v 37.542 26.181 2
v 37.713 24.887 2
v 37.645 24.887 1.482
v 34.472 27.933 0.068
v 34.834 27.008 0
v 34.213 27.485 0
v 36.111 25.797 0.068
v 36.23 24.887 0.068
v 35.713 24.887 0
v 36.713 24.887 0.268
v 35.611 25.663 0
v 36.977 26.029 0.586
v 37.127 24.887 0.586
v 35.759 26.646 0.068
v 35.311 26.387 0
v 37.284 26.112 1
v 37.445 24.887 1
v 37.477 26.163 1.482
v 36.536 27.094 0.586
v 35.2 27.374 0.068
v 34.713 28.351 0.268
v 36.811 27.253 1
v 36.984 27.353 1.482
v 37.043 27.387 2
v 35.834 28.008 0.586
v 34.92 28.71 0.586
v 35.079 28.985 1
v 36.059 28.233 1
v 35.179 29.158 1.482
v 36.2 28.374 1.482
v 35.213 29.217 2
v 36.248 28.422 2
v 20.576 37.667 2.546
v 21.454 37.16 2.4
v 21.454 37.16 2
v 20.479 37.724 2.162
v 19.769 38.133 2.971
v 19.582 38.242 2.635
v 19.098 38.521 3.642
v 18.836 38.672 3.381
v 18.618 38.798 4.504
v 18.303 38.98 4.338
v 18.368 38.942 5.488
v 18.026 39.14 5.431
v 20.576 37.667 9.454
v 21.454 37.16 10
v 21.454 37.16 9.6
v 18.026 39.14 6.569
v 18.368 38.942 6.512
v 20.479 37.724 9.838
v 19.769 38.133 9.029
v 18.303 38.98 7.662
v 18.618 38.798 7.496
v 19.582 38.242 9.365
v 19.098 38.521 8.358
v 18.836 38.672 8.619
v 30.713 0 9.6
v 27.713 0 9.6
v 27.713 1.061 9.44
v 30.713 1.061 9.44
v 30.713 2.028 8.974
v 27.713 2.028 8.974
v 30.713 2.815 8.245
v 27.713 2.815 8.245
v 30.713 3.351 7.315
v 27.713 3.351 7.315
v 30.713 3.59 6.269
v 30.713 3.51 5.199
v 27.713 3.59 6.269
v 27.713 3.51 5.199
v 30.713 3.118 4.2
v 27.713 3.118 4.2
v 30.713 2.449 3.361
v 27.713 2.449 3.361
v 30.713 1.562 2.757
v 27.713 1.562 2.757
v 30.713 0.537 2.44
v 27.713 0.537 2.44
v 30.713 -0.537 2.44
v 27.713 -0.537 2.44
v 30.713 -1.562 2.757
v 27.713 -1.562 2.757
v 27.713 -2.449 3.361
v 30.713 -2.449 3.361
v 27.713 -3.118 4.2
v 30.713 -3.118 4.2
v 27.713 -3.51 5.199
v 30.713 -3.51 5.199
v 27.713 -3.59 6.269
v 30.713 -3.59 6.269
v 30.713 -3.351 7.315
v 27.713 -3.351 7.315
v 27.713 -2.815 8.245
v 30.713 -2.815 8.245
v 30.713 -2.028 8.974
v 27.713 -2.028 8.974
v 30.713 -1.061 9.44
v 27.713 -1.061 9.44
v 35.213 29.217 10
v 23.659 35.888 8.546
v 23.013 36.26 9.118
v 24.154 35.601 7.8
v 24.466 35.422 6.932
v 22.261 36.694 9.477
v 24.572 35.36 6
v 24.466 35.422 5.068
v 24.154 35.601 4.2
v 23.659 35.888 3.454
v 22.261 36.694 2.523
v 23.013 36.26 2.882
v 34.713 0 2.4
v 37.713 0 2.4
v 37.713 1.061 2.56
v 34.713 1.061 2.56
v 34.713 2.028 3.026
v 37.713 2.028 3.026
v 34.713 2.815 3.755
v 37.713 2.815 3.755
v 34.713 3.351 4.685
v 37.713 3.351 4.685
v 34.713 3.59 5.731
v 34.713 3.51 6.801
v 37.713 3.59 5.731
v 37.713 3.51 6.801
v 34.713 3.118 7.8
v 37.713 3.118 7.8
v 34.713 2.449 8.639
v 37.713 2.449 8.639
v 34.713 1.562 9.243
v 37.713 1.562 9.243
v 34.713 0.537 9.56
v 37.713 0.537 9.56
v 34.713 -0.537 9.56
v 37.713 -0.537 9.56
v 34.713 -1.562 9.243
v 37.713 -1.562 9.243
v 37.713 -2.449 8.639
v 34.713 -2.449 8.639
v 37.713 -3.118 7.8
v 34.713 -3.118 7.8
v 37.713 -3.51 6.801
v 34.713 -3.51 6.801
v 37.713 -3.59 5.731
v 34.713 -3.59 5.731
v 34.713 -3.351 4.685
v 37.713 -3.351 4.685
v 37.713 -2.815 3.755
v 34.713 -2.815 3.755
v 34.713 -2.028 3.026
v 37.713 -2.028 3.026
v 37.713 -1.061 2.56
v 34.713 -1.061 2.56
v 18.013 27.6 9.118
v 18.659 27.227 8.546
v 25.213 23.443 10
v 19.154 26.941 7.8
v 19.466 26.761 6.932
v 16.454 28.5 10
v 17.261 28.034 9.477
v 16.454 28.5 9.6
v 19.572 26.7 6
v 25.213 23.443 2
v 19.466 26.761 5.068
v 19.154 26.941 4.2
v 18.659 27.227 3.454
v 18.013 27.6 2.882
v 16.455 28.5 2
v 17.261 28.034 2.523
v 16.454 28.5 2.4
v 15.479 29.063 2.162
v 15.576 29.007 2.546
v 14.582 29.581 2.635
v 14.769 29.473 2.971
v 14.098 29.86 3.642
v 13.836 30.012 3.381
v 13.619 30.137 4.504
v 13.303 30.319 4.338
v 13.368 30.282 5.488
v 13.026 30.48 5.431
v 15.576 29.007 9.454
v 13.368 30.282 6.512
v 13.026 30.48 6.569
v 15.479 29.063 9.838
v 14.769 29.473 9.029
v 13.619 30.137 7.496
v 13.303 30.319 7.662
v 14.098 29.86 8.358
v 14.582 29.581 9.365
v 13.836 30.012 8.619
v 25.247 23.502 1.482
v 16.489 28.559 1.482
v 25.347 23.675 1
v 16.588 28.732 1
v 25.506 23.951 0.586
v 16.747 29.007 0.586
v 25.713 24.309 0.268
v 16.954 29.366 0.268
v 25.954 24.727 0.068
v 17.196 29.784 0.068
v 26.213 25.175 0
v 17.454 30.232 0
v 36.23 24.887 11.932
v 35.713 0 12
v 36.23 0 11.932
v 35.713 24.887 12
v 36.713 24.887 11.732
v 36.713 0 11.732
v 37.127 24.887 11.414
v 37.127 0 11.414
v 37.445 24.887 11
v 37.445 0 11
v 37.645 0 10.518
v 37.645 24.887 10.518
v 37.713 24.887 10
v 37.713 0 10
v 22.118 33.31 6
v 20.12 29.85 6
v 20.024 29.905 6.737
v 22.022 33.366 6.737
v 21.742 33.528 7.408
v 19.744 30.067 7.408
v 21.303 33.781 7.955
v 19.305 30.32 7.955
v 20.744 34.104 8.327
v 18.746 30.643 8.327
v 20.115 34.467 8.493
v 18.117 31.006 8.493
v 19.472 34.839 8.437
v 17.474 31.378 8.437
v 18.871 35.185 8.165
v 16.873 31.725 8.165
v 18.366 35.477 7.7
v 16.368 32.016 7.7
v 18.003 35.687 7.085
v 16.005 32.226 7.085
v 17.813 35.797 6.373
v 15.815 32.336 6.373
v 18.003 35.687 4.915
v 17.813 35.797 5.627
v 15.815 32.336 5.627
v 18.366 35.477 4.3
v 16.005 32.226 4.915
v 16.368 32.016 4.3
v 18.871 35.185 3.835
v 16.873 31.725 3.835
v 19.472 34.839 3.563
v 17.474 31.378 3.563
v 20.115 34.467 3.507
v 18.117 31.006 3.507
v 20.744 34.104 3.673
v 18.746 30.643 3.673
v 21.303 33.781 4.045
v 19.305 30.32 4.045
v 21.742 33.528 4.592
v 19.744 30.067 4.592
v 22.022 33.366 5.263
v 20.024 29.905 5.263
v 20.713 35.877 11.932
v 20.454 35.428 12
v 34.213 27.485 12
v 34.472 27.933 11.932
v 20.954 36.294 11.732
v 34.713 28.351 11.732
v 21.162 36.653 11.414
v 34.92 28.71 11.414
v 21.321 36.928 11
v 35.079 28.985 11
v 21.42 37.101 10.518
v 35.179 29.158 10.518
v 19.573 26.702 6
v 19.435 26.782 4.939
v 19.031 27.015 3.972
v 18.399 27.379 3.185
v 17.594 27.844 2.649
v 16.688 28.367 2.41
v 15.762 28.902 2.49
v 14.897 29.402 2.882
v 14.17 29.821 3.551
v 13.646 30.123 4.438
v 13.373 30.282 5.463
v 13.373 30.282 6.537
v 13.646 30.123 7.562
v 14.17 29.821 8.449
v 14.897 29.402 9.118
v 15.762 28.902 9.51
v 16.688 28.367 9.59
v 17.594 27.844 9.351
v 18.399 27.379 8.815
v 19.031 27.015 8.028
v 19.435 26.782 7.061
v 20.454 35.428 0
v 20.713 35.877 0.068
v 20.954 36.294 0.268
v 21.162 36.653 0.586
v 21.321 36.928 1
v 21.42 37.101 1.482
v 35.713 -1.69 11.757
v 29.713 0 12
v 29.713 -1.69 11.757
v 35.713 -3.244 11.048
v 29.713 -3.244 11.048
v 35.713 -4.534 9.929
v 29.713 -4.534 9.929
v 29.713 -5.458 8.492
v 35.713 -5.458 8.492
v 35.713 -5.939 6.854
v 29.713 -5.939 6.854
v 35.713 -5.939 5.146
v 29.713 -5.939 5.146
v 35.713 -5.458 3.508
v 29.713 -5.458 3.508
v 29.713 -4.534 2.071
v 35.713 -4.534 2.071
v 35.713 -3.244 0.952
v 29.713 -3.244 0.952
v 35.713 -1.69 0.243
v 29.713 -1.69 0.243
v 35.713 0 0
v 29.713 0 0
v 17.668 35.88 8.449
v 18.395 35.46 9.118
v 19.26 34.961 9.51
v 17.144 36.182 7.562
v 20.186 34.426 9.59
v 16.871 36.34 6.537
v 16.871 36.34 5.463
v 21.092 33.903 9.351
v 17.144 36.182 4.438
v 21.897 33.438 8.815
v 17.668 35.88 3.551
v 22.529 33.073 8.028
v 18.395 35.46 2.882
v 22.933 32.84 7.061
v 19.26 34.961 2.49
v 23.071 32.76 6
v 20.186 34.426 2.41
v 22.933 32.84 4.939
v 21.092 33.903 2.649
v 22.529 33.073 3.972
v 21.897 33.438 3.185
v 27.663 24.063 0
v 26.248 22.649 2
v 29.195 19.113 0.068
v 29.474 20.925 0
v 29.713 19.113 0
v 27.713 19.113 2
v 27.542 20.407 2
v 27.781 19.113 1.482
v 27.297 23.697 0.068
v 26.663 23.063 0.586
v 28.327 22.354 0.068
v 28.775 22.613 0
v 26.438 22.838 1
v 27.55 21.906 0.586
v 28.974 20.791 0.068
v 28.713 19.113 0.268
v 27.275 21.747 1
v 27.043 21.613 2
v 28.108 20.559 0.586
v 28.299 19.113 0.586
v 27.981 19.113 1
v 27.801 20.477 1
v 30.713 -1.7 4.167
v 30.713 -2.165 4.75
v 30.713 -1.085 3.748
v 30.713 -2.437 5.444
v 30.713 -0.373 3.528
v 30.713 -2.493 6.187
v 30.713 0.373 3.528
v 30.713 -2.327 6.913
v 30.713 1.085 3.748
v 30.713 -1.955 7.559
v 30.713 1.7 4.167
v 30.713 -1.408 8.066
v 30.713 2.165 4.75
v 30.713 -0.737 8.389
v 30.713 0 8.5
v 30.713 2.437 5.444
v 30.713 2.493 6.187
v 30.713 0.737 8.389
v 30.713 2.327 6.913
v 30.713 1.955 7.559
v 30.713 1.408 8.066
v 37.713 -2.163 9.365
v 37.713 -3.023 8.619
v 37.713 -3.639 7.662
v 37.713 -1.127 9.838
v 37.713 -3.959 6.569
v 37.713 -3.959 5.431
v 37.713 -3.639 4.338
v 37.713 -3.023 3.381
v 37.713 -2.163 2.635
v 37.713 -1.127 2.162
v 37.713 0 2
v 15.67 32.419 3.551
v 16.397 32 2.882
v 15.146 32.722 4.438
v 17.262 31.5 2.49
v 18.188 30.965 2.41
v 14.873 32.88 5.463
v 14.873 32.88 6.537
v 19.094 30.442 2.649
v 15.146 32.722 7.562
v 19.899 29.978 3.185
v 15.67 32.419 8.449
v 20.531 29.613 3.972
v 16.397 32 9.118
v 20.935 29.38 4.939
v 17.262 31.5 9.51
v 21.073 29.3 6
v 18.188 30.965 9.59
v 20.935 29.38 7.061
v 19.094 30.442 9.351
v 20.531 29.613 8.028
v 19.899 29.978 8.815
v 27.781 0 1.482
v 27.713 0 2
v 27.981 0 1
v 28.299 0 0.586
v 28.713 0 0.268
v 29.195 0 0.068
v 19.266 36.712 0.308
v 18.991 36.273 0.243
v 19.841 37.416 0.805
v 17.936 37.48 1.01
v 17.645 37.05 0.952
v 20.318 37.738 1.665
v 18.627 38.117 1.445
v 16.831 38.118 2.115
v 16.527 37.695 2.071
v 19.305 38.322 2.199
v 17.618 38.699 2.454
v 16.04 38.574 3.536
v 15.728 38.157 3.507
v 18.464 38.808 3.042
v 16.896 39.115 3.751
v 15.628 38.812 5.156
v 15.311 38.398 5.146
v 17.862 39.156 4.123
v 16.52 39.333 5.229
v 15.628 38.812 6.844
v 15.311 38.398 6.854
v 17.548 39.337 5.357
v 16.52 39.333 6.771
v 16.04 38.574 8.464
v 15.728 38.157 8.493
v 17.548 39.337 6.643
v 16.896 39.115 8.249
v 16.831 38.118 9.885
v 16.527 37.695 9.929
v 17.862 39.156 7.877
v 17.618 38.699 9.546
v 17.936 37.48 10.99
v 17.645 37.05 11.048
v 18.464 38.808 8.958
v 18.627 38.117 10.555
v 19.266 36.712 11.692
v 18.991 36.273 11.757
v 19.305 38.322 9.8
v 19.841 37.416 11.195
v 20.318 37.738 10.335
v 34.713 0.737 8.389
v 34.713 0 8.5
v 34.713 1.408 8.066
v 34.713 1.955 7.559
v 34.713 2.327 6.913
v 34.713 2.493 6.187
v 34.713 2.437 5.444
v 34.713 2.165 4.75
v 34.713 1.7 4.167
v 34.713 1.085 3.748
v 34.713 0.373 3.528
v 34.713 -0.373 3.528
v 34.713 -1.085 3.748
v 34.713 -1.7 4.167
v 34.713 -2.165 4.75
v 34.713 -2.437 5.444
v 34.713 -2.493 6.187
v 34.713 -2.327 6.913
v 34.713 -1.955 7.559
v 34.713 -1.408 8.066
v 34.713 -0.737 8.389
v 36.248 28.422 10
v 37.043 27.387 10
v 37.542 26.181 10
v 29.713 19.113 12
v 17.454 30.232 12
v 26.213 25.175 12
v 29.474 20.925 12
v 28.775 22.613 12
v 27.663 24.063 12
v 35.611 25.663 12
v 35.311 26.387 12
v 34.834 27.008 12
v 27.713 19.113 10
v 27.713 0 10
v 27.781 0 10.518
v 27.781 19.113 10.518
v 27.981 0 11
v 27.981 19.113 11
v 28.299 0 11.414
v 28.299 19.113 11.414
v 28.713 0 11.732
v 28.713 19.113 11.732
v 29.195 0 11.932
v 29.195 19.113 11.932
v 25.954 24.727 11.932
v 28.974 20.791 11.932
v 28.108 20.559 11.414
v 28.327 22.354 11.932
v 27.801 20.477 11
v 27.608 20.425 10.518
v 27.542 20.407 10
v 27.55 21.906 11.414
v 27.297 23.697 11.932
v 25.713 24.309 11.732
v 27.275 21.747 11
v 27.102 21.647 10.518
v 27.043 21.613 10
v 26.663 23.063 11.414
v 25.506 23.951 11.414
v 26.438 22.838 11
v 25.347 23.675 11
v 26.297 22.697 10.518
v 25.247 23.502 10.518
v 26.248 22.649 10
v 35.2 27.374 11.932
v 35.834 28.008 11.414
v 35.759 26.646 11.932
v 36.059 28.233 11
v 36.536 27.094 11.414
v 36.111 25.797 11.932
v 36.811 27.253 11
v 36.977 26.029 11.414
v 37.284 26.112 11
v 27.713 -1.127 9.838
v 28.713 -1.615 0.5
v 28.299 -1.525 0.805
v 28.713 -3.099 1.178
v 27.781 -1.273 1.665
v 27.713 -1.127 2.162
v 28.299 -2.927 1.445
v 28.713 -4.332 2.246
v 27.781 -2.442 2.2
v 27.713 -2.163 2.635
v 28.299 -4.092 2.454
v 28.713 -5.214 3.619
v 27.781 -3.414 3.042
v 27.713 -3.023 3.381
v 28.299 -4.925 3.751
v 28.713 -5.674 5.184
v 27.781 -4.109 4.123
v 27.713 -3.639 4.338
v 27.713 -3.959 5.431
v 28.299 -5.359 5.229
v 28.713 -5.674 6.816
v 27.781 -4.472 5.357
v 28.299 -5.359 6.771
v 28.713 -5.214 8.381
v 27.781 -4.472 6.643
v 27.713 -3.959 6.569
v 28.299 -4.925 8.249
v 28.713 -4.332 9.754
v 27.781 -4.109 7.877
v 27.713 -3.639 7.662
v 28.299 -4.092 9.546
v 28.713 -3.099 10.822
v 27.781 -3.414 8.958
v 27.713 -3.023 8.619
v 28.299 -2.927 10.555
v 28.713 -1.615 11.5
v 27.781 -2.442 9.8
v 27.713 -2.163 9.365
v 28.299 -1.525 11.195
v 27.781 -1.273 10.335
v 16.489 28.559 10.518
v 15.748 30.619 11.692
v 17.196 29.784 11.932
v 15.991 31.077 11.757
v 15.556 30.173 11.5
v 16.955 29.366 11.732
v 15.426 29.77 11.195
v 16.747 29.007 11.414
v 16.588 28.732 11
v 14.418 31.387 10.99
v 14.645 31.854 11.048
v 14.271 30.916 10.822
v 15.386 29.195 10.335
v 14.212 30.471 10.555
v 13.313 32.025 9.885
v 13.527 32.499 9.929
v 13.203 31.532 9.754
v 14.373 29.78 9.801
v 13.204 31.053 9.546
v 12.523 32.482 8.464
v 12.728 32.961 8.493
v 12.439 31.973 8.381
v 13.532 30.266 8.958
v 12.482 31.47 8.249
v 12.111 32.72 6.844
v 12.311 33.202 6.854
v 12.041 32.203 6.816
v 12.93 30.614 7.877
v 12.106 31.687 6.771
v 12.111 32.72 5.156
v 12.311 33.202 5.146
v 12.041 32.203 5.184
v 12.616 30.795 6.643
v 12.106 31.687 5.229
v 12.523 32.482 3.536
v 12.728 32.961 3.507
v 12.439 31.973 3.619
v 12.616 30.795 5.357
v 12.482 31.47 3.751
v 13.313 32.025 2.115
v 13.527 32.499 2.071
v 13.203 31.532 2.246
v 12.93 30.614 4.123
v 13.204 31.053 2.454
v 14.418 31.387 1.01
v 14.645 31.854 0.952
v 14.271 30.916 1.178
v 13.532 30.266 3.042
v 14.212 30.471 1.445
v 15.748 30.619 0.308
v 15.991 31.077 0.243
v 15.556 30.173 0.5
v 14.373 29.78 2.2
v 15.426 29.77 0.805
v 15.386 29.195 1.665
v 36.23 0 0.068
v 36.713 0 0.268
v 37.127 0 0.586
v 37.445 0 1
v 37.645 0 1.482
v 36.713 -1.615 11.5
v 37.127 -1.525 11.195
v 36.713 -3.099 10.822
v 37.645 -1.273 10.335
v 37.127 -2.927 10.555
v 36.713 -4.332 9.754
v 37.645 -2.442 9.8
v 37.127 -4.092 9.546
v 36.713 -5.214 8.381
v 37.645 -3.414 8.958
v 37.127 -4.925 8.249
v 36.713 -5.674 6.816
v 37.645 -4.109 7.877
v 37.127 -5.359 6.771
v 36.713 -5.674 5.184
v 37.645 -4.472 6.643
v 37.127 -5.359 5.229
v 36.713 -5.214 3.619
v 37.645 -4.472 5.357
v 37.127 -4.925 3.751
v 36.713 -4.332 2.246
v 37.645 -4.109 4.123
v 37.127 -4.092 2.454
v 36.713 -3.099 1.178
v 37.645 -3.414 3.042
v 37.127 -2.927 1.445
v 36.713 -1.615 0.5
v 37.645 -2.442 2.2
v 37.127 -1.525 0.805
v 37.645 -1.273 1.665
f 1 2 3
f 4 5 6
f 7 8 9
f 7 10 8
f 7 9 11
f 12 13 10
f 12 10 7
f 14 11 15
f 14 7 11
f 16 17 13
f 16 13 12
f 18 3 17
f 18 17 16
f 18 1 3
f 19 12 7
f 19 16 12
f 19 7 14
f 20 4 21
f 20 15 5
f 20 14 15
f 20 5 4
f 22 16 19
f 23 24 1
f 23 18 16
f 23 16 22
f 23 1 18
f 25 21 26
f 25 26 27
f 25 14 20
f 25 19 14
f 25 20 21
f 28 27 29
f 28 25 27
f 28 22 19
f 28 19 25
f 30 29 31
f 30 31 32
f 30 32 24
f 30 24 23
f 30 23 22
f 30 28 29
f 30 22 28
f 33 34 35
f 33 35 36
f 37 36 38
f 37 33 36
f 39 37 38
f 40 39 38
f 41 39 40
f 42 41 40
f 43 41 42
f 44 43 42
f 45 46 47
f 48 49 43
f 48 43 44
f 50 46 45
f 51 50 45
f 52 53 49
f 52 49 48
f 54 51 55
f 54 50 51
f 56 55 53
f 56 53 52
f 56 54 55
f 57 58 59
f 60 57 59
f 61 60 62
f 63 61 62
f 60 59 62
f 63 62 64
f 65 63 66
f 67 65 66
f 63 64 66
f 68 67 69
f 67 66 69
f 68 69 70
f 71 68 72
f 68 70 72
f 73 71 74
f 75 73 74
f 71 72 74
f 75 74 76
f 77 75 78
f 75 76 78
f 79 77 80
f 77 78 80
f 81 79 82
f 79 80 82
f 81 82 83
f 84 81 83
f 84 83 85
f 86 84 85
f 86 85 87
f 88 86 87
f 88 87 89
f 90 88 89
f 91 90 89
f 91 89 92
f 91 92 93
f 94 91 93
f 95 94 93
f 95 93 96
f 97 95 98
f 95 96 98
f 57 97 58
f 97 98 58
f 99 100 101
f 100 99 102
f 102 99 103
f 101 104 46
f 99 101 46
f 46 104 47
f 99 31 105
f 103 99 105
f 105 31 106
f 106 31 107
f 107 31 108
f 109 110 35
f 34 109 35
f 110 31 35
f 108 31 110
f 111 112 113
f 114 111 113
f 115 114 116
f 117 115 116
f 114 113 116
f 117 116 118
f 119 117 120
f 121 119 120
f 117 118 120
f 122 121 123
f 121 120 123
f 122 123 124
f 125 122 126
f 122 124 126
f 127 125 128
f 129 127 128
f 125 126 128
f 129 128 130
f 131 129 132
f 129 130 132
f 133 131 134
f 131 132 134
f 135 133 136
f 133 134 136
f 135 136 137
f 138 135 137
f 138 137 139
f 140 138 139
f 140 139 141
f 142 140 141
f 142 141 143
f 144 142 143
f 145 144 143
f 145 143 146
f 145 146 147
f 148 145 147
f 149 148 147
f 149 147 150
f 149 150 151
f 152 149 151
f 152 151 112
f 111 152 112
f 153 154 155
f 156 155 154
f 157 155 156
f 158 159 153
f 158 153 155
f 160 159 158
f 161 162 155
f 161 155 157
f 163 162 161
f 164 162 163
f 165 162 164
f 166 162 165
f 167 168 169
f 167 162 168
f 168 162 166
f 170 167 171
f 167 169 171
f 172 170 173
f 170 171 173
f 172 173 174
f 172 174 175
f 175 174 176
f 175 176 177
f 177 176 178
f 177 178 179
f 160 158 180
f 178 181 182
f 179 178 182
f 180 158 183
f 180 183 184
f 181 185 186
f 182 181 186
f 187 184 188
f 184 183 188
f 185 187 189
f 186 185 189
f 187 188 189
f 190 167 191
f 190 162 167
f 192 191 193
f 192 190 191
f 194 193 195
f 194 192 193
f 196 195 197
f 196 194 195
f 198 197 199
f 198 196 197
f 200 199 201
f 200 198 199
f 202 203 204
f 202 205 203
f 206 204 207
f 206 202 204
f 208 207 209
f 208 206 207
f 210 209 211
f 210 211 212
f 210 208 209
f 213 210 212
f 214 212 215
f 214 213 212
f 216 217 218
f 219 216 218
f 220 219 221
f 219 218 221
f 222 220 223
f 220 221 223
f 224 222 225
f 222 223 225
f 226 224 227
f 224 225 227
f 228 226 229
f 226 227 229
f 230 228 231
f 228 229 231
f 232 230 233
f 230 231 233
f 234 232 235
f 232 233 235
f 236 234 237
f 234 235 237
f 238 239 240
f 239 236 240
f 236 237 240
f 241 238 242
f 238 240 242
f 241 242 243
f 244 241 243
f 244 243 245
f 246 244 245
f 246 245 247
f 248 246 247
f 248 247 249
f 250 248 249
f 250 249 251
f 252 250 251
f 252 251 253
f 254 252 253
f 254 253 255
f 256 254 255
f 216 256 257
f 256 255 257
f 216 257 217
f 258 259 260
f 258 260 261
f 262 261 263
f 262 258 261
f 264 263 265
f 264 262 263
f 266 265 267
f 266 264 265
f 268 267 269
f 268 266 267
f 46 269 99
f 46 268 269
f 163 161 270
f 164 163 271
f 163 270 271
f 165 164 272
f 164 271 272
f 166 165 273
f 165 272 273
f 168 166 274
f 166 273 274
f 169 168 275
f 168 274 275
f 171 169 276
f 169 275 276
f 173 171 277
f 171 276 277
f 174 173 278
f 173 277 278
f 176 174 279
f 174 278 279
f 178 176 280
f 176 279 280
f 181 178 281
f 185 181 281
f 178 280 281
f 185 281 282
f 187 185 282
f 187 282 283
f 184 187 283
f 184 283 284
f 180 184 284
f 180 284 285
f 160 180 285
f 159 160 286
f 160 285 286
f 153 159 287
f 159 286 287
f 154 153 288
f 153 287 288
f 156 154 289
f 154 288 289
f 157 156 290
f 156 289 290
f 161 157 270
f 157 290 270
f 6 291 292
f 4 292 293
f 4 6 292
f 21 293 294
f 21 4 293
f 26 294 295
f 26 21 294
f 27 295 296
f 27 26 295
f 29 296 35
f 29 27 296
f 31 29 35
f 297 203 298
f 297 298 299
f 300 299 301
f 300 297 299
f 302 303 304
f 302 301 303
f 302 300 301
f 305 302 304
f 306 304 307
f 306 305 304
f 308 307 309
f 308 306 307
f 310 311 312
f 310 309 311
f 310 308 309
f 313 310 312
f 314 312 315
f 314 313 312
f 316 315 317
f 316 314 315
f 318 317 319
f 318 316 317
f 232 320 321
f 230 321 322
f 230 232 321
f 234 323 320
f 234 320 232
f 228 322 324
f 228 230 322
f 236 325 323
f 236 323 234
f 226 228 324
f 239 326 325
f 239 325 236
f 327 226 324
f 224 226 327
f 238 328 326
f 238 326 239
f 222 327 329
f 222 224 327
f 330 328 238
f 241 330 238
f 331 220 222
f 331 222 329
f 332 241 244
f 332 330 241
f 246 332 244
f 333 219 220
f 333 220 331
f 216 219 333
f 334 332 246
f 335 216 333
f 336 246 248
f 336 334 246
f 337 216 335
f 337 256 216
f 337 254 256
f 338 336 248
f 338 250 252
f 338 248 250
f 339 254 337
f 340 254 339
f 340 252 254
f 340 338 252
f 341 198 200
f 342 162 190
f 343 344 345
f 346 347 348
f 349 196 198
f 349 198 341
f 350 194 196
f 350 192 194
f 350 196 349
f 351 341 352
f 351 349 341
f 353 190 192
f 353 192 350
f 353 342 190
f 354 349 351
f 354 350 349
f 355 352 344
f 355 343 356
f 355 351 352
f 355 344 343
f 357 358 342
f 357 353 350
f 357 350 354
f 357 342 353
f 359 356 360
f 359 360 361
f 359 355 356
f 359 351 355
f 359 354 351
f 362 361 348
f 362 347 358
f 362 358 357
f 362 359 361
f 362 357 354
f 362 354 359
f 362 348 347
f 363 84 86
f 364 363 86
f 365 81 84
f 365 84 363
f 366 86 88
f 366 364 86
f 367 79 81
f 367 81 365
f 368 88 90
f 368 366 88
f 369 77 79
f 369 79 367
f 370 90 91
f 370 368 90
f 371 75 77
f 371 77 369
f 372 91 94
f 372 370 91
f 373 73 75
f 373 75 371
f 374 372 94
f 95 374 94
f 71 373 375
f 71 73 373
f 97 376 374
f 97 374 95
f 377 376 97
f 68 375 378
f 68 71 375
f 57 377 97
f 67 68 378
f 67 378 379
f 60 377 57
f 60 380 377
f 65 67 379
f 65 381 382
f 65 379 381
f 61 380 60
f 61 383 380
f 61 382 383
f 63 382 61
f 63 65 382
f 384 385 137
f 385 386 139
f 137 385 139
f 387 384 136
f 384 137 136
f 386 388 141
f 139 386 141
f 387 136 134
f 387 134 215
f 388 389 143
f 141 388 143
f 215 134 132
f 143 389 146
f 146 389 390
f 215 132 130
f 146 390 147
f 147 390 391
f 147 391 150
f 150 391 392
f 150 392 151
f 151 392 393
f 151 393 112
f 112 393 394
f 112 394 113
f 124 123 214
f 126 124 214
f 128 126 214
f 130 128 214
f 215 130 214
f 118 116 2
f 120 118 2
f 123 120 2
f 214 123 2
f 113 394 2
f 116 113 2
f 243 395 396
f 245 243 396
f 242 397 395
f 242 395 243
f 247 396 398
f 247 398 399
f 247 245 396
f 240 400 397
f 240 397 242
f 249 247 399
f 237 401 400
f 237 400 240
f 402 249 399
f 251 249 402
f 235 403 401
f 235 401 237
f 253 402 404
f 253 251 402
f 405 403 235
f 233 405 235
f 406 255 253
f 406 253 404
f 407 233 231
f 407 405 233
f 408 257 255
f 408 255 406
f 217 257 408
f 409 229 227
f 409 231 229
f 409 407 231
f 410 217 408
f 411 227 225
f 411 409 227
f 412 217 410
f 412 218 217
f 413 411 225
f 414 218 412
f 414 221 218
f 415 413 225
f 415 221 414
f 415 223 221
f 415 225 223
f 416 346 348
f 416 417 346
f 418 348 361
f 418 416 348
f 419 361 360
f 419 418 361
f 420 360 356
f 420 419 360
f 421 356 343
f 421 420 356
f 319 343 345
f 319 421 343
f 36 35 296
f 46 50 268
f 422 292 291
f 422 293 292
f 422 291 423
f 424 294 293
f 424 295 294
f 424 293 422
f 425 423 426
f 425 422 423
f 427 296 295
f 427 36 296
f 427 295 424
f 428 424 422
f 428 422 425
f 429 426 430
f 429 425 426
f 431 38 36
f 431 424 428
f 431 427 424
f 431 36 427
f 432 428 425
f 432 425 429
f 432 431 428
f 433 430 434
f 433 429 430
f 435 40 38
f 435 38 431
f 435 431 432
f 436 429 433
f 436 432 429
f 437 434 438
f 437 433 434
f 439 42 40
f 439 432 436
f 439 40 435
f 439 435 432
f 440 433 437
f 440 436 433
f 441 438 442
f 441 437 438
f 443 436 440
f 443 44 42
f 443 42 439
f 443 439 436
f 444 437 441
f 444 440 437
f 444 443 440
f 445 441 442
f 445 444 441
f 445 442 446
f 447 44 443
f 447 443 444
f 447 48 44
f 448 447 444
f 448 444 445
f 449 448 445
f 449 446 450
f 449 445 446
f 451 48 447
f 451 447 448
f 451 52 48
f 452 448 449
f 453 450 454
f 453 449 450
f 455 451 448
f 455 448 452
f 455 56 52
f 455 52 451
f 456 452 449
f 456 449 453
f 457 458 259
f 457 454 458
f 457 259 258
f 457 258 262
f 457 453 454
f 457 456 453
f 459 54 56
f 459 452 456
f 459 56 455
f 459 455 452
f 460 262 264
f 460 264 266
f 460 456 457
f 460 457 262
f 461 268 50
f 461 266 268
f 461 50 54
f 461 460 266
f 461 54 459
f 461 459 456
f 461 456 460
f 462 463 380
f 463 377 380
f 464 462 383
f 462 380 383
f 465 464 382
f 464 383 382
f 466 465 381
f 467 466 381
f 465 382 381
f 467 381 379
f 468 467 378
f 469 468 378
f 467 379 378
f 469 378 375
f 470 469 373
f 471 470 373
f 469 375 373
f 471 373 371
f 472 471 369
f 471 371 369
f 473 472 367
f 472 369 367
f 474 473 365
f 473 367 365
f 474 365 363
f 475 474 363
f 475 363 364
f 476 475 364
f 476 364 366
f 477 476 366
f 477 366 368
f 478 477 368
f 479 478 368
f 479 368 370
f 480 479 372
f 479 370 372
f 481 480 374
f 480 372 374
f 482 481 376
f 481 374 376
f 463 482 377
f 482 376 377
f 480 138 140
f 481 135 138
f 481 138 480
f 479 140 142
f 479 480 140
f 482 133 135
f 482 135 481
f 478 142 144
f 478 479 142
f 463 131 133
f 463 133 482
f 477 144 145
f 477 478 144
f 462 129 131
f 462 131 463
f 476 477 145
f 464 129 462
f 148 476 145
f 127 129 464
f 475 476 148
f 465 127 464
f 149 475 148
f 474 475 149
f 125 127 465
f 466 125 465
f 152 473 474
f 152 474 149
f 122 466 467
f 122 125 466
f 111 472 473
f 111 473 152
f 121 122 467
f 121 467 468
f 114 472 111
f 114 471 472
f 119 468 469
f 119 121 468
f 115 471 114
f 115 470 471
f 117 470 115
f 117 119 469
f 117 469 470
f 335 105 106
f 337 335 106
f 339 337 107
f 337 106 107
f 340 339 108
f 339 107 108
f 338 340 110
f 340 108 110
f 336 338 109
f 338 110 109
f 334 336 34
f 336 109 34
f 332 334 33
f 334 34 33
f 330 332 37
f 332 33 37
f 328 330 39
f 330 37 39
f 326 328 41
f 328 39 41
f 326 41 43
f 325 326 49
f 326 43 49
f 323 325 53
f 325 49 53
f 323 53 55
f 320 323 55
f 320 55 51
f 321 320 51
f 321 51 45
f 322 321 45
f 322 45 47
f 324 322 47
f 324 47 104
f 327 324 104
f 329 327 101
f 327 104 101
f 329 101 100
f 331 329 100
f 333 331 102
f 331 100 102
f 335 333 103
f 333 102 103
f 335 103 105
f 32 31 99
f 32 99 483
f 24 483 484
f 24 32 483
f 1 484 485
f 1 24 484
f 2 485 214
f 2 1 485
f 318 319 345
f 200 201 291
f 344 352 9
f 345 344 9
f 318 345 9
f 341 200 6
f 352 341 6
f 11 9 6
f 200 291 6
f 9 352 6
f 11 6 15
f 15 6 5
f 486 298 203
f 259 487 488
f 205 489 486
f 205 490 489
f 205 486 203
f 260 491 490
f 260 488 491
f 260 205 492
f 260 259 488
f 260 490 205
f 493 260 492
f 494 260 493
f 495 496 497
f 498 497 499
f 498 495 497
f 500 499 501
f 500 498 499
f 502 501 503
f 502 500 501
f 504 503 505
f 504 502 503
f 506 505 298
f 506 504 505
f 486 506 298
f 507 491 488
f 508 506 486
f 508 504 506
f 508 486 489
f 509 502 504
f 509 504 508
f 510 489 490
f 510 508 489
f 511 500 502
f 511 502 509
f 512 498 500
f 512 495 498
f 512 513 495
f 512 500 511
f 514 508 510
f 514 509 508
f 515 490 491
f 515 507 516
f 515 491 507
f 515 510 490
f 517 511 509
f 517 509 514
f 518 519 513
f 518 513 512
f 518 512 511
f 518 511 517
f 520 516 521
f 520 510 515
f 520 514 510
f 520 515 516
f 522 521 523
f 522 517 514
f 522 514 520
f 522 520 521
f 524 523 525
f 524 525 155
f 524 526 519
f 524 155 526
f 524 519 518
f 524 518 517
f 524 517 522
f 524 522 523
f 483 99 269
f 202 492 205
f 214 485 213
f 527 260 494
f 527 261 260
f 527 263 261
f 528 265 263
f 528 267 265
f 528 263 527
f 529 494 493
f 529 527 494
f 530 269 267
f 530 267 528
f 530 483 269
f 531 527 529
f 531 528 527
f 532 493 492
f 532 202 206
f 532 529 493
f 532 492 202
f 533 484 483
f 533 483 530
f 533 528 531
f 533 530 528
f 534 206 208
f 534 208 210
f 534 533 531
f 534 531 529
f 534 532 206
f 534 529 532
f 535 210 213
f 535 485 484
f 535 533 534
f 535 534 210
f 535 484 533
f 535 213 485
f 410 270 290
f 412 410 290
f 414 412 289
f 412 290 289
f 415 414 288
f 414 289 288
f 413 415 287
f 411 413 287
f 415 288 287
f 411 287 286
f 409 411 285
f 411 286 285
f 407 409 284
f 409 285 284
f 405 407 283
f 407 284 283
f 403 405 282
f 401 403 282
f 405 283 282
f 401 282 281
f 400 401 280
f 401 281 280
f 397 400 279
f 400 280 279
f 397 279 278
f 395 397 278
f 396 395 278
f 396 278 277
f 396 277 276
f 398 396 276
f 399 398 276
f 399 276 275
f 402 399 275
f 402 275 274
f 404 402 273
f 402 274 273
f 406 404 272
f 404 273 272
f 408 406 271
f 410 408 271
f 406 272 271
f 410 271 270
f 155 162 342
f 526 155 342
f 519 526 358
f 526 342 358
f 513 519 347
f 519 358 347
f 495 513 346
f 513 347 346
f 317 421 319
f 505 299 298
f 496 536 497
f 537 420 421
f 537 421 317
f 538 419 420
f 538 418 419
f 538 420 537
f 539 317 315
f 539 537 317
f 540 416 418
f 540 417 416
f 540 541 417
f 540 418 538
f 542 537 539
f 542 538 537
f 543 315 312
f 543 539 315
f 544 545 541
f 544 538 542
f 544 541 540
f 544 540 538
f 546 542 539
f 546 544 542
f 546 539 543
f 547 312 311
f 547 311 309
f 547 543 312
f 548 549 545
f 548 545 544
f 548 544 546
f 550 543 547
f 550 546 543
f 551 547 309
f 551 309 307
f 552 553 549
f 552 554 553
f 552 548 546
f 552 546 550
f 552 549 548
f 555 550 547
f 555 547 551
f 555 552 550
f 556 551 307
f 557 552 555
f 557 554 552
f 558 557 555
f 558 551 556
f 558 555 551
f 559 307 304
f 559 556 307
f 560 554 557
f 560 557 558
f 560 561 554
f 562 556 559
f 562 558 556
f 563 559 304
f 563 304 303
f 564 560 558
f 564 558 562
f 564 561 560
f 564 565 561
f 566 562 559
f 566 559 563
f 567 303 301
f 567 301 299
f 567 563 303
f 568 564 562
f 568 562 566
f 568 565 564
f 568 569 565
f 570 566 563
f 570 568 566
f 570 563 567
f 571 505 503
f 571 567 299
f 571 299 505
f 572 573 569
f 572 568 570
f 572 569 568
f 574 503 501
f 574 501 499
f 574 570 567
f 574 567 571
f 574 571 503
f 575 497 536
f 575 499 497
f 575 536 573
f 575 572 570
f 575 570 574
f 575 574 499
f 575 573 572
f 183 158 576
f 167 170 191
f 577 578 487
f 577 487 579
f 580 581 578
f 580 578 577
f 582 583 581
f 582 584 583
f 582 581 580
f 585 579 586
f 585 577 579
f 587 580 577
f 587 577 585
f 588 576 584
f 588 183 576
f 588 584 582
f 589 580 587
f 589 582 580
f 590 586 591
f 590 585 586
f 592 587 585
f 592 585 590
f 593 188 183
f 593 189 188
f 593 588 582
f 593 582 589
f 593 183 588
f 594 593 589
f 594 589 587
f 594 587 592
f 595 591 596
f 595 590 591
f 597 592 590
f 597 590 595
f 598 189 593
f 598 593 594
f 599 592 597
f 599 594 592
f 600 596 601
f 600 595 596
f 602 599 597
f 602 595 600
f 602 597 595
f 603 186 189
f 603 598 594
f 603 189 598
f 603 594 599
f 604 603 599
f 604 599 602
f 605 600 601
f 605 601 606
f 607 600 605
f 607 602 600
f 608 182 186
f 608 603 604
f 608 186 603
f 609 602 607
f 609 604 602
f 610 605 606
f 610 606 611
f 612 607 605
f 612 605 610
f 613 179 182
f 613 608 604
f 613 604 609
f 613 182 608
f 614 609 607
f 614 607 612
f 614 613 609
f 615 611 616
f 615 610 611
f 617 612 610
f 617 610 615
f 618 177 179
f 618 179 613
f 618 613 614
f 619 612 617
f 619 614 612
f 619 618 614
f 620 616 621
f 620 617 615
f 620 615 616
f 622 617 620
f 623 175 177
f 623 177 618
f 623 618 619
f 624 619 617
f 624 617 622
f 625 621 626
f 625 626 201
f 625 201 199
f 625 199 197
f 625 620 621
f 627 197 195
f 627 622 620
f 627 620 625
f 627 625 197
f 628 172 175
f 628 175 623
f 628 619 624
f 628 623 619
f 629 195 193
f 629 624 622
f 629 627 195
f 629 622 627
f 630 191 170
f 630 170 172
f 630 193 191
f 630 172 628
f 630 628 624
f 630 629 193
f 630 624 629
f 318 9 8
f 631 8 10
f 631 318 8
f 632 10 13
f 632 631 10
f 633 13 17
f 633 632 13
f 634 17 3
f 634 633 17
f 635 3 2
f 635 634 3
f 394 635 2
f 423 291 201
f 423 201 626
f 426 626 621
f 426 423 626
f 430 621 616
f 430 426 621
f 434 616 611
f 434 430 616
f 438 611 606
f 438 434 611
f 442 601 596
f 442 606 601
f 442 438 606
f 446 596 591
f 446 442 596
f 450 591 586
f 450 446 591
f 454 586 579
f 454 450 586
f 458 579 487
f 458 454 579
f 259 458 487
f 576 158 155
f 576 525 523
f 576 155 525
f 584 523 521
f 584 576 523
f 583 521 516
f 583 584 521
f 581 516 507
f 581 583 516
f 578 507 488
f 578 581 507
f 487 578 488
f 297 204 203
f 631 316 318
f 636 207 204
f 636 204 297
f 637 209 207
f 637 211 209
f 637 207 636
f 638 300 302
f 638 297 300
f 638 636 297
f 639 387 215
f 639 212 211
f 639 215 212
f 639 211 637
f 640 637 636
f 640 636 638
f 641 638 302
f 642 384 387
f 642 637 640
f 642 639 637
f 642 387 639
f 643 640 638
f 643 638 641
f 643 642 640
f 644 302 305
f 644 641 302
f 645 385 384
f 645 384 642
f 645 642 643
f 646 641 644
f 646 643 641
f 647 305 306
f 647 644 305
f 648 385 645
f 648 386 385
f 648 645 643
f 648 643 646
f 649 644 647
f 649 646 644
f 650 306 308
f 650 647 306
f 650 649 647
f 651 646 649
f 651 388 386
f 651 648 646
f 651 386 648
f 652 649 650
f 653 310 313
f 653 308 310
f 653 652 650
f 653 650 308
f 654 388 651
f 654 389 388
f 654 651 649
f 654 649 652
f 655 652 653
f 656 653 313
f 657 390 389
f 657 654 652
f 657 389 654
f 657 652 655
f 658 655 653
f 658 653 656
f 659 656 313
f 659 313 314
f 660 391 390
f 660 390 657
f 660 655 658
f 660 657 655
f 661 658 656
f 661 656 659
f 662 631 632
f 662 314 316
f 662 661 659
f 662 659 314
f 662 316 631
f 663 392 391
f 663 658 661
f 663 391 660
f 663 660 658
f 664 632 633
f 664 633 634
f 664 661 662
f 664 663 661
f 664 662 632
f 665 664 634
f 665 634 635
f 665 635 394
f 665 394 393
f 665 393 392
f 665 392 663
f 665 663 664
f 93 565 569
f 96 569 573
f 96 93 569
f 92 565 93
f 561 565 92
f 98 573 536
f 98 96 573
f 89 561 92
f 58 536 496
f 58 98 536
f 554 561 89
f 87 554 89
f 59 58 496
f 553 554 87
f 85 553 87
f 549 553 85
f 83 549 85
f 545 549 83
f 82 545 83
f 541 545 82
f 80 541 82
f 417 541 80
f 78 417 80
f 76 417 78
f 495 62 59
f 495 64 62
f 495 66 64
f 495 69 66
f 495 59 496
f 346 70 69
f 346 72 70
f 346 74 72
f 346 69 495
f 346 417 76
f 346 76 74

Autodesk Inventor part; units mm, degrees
ref_plane "YZ Plane" through (0, 0, 0) normal (1, 0, 0) x (0, 1, 0)
sketch "Sketch1" plane through (0, 0, 0) normal (0, 0, 1) x (1, 0, 0)
  line L0 (37.7128, 0) -> (0, 0)
  line L1 (0, 0) -> (34.8308, 60.3287)
  line L2 (27.7128, 0) -> (27.7128, 19.1132)
  line L3 (25.2128, 23.4434) -> (16.4545, 28.5)
  line L4 (37.7128, 0) -> (37.7128, 24.8868)
  line L5 (35.2128, 29.2169) -> (21.4545, 37.1603)
  arc A0 (27.7128, 19.1132) -> (25.2128, 23.4434) centre (22.7128, 19.1132) ccw
  arc A1 (37.7128, 24.8868) -> (35.2128, 29.2169) centre (32.7128, 24.8868) ccw
  line L6 (21.4545, 37.1603) -> (16.4545, 28.5)
  line L7 (21.4545, 37.1603) -> (35.2128, 29.2169)
  line L8 (16.4545, 28.5) -> (25.2128, 23.4434)
  line L9 (27.7128, 0) -> (37.7128, 0)
  line L10 (37.7128, 0) -> (37.7128, 24.8868)
  line L11 (27.7128, 0) -> (37.7128, 0)
  line L12 (37.7128, 0) -> (37.7128, 24.8868)
  line L13 (35.2128, 29.2169) -> (21.4545, 37.1603)
  line L14 (21.4545, 37.1603) -> (16.4545, 28.5)
  line L15 (16.4545, 28.5) -> (25.2128, 23.4434)
  line L16 (27.7128, 19.1132) -> (27.7128, 0)
  point P0 (25, 43.3013)
  point P1 (27.7128, 22)
  dimension "d37" = 60
  dimension "d38" = 10
  dimension "d39" = 10
  dimension "d40" = 0
  dimension "d41" = 0
  dimension "d42" = 22
  dimension "d43" = 13
  dimension "d44" = 120
  dimension "d45" = 5
extrude "Extrusion1" add sketch "Sketch1" along normal blind 12 contours L0 L2 A0 L3 L1 L5 A1 L4
ref_plane "Work Plane1" through (35.2128, 29.2169, 0) normal (0.5, 0.8660254, 0) x (-0.8660254, 0.5, 0)
sketch "Sketch2" plane through (35.2128, 29.2169, 0) normal (0.5, 0.8660254, 0) x (-0.8660254, 0.5, 0)
  circle A0 centre (15.8868, 6) radius 6
  line L0 (15.8868, 0) -> (15.8868, 12) projected
  line L1 (0, 12) -> (15.8868, 12) projected
  dimension "d5" = 12
  dimension "d47" = 0
  dimension "d48" = 6
extrude "Extrusion2" add sketch "Sketch2" against normal blind 10
ref_plane "Work Plane2" through (37.7128, 24.8868, 0) normal (1, 0, 0) x (0, 1, 0)
sketch "Sketch3" plane through (37.7128, 24.8868, 0) normal (1, 0, 0) x (0, 1, 0)
  circle A0 centre (-24.8868, 6) radius 6
  line L0 (-24.8868, 0) -> (-24.8868, 12) projected
  line L1 (-24.8868, 0) -> (0, 0) projected
  point P0 (43.3013, 10)
  point P1 (3.6132, 12)
  dimension "d10" = 12
  dimension "d49" = 0
  dimension "d50" = 6
extrude "Extrusion3" add sketch "Sketch3" against normal blind 10
sketch "Sketch4" plane through (30.2128, 20.5566, 0) normal (-0.5, -0.8660254, 0) x (0.8660254, -0.5, 0)
  circle A0 centre (-15.8868, 6) radius 2.5
  circle A1 centre (-15.8868, 6) radius 6 projected
  point P0 (-15.8868, 0)
  point P1 (-15.8868, 12)
  dimension "d15" = 5
extrude "Extrusion4" cut sketch "Sketch4" along normal through all both and the other way through all contours A0
sketch "Sketch5" plane through (27.7128, 24.8868, 0) normal (-1, 0, 0) x (0, 0, 1)
  circle A0 centre (6, -24.8868) radius 2.5
  arc A1 (0, -24.8868) -> (12, -24.8868) centre (6, -24.8868) ccw projected
  dimension "d18" = 5
extrude "Extrusion5" cut sketch "Sketch5" along normal through all both and the other way through all
sketch "Sketch6" plane through (35.2128, 29.2169, 0) normal (0.5, 0.8660254, 0) x (0.8660254, -0.5, 0)
  circle A0 centre (-15.8868, -6) radius 3.6
  circle A1 centre (-15.8868, -6) radius 2.5
  arc A2 (-15.8868, 0) -> (-15.8868, 0) centre (-15.8868, -6) ccw projected
  point P0 (0, -10)
  dimension "d21" = 5
  dimension "d22" = 7.2
extrude "Extrusion6" cut sketch "Sketch6" against normal blind 3 contours A0
sketch "Sketch7" plane through (30.2128, 20.5566, 0) normal (-0.5, -0.8660254, 0) x (0.8660254, -0.5, 0)
  circle A0 centre (-15.8868, 6) radius 3.6
  circle A1 centre (-15.8868, 6) radius 2.5
  arc A2 (-13.3868, 6) -> (-13.3868, 6) centre (-15.8868, 6) ccw projected
  point P0 (-15.8868, 0)
  dimension "d25" = 5
  dimension "d26" = 7.2
extrude "Extrusion7" cut sketch "Sketch7" along normal mid plane 6
sketch "Sketch8" plane through (27.7128, 24.8868, 0) normal (-1, 0, 0) x (0, 0, 1)
  circle A0 centre (6, -24.8868) radius 3.6
  circle A1 centre (6, -24.8868) radius 2.5
  arc A2 (8.5, -24.8868) -> (8.5, -24.8868) centre (6, -24.8868) ccw projected
  point P0 (0, -24.8868)
  dimension "d29" = 7.2
  dimension "d30" = 5
extrude "Extrusion8" cut sketch "Sketch8" along normal mid plane 6
sketch "Sketch9" plane through (37.7128, 24.8868, 0) normal (1, 0, 0) x (0, 0, -1)
  circle A0 centre (-6, -24.8868) radius 3.6
  circle A1 centre (-6, -24.8868) radius 2.5
  circle A2 centre (-6, -24.8868) radius 2.5 projected
  point P0 (0, -24.8868)
  dimension "d33" = 5
  dimension "d34" = 7.2
extrude "Extrusion9" cut sketch "Sketch9" against normal blind 3
fillet "Fillet1" radius 2 16 edges at (16.2583, 40.1603, 6) (28.3336, 33.1886, 0) (37.0429, 27.3868, 0) (37.7128, 12.4434, 0) (37.7128, -6, 6) (37.7128, 12.4434, 12) (37.0429, 27.3868, 12) (28.3336, 33.1886, 12) (27.0429, 21.6132, 12) (27.7128, 9.5566, 12) (27.7128, -6, 6) (27.7128, 9.5566, 0) (27.0429, 21.6132, 0) (20.8336, 25.9717, 0) (11.2583, 31.5, 6) (20.8336, 25.9717, 12)
equation "\"d38\" = d46"
equation "\"d39\" = d46"
equation "\"d3\" = width"
equation "\"d5\" = width"
equation "\"d48\" = 0.5 * width"
equation "\"d8\" = thickness"
equation "\"d10\" = width"
equation "\"d50\" = 0.5 * width"
equation "\"d13\" = thickness"
equation "\"thickness\" = thickness_1"
equation "\"width\" = width_1"
equation "\"d46\" = 10"
equation "\"thickness_1\" = 10"
equation "\"width_1\" = 12"
properties part number "Link2"
